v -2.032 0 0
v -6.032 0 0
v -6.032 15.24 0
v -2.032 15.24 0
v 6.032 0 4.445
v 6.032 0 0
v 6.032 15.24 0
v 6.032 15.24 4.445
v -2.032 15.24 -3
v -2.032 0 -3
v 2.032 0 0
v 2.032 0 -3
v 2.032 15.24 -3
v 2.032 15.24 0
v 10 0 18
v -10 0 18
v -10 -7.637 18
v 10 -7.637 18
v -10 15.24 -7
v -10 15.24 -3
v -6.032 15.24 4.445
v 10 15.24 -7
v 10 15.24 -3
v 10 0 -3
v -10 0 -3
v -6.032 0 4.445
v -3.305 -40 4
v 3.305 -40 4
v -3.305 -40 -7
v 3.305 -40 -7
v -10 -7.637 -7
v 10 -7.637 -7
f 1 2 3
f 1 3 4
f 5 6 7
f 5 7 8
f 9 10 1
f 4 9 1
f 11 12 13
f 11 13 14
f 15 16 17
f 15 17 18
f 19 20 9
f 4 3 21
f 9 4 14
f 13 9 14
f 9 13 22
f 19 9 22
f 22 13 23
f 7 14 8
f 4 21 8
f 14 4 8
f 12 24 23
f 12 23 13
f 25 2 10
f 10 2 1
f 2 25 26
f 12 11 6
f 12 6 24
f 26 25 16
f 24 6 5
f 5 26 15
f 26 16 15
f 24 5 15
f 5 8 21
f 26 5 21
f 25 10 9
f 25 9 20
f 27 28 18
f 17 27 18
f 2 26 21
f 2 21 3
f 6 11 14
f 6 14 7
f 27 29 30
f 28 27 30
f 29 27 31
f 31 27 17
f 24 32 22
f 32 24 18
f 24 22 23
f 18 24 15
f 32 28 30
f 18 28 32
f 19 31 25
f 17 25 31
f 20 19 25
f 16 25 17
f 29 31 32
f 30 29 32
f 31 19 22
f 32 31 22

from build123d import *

# Parameters (mm, degrees)
F0_W     = 4.064
F0_H     = 3
F1_DEPTH = 15.24
F2_W     = 20
F2_H     = 25
F3_DEPTH = 40
F5_DEPTH = 25.001
F7_DEPTH = 20.001


# Not quite as in the source:
# - a pattern or mirror of a feature is missing from the dataset's text; its kind, count and spacing are read off the source's solid


with BuildPart() as f1:
    # F0 (on Front) → F1 (new body)
    with BuildSketch(Plane.XZ):
        Polygon((6.0325, 4.445), (-6.0325, 4.445), (-6.0325, 0), (-2.032, 0), (2.032, 0), (6.0325, 0), align=None)
        with Locations((0, -1.5)):
            Rectangle(F0_W, F0_H)
        Polygon((2.032, -3), (-2.032, -3), (-10, -3), (-10, -7), (10, -7), (10, -3), align=None)
    extrude(amount=-F1_DEPTH)

    # F2 (on face) → F3 (join)
    with BuildSketch(Plane.XZ):
        with Locations((0, 5.5)):
            Rectangle(F2_W, F2_H)
    extrude(amount=F3_DEPTH)

    # F4 (on face) → F5 (cut, through all)
    with BuildSketch(Plane.XY.offset(18)):
        Polygon((-3.305207938, -40), (-10, -7.6365470886), (-10, -40), align=None)
    f5 = extrude(amount=-F5_DEPTH, mode=Mode.SUBTRACT)

    # F5_copies: F5 across plane
    add(f5.mirror(Plane(origin=(0, 0, 0), x_dir=(0, 0, 1), z_dir=(1, 0, 0))), mode=Mode.SUBTRACT)

    # F6 (on face) → F7 (cut, through all)
    with BuildSketch(Plane.YZ.offset(10)):
        Polygon((-40, 18), (-40, 4), (-7.6365470886, 18), align=None)
    extrude(amount=-F7_DEPTH, mode=Mode.SUBTRACT)


solid = f1.part
